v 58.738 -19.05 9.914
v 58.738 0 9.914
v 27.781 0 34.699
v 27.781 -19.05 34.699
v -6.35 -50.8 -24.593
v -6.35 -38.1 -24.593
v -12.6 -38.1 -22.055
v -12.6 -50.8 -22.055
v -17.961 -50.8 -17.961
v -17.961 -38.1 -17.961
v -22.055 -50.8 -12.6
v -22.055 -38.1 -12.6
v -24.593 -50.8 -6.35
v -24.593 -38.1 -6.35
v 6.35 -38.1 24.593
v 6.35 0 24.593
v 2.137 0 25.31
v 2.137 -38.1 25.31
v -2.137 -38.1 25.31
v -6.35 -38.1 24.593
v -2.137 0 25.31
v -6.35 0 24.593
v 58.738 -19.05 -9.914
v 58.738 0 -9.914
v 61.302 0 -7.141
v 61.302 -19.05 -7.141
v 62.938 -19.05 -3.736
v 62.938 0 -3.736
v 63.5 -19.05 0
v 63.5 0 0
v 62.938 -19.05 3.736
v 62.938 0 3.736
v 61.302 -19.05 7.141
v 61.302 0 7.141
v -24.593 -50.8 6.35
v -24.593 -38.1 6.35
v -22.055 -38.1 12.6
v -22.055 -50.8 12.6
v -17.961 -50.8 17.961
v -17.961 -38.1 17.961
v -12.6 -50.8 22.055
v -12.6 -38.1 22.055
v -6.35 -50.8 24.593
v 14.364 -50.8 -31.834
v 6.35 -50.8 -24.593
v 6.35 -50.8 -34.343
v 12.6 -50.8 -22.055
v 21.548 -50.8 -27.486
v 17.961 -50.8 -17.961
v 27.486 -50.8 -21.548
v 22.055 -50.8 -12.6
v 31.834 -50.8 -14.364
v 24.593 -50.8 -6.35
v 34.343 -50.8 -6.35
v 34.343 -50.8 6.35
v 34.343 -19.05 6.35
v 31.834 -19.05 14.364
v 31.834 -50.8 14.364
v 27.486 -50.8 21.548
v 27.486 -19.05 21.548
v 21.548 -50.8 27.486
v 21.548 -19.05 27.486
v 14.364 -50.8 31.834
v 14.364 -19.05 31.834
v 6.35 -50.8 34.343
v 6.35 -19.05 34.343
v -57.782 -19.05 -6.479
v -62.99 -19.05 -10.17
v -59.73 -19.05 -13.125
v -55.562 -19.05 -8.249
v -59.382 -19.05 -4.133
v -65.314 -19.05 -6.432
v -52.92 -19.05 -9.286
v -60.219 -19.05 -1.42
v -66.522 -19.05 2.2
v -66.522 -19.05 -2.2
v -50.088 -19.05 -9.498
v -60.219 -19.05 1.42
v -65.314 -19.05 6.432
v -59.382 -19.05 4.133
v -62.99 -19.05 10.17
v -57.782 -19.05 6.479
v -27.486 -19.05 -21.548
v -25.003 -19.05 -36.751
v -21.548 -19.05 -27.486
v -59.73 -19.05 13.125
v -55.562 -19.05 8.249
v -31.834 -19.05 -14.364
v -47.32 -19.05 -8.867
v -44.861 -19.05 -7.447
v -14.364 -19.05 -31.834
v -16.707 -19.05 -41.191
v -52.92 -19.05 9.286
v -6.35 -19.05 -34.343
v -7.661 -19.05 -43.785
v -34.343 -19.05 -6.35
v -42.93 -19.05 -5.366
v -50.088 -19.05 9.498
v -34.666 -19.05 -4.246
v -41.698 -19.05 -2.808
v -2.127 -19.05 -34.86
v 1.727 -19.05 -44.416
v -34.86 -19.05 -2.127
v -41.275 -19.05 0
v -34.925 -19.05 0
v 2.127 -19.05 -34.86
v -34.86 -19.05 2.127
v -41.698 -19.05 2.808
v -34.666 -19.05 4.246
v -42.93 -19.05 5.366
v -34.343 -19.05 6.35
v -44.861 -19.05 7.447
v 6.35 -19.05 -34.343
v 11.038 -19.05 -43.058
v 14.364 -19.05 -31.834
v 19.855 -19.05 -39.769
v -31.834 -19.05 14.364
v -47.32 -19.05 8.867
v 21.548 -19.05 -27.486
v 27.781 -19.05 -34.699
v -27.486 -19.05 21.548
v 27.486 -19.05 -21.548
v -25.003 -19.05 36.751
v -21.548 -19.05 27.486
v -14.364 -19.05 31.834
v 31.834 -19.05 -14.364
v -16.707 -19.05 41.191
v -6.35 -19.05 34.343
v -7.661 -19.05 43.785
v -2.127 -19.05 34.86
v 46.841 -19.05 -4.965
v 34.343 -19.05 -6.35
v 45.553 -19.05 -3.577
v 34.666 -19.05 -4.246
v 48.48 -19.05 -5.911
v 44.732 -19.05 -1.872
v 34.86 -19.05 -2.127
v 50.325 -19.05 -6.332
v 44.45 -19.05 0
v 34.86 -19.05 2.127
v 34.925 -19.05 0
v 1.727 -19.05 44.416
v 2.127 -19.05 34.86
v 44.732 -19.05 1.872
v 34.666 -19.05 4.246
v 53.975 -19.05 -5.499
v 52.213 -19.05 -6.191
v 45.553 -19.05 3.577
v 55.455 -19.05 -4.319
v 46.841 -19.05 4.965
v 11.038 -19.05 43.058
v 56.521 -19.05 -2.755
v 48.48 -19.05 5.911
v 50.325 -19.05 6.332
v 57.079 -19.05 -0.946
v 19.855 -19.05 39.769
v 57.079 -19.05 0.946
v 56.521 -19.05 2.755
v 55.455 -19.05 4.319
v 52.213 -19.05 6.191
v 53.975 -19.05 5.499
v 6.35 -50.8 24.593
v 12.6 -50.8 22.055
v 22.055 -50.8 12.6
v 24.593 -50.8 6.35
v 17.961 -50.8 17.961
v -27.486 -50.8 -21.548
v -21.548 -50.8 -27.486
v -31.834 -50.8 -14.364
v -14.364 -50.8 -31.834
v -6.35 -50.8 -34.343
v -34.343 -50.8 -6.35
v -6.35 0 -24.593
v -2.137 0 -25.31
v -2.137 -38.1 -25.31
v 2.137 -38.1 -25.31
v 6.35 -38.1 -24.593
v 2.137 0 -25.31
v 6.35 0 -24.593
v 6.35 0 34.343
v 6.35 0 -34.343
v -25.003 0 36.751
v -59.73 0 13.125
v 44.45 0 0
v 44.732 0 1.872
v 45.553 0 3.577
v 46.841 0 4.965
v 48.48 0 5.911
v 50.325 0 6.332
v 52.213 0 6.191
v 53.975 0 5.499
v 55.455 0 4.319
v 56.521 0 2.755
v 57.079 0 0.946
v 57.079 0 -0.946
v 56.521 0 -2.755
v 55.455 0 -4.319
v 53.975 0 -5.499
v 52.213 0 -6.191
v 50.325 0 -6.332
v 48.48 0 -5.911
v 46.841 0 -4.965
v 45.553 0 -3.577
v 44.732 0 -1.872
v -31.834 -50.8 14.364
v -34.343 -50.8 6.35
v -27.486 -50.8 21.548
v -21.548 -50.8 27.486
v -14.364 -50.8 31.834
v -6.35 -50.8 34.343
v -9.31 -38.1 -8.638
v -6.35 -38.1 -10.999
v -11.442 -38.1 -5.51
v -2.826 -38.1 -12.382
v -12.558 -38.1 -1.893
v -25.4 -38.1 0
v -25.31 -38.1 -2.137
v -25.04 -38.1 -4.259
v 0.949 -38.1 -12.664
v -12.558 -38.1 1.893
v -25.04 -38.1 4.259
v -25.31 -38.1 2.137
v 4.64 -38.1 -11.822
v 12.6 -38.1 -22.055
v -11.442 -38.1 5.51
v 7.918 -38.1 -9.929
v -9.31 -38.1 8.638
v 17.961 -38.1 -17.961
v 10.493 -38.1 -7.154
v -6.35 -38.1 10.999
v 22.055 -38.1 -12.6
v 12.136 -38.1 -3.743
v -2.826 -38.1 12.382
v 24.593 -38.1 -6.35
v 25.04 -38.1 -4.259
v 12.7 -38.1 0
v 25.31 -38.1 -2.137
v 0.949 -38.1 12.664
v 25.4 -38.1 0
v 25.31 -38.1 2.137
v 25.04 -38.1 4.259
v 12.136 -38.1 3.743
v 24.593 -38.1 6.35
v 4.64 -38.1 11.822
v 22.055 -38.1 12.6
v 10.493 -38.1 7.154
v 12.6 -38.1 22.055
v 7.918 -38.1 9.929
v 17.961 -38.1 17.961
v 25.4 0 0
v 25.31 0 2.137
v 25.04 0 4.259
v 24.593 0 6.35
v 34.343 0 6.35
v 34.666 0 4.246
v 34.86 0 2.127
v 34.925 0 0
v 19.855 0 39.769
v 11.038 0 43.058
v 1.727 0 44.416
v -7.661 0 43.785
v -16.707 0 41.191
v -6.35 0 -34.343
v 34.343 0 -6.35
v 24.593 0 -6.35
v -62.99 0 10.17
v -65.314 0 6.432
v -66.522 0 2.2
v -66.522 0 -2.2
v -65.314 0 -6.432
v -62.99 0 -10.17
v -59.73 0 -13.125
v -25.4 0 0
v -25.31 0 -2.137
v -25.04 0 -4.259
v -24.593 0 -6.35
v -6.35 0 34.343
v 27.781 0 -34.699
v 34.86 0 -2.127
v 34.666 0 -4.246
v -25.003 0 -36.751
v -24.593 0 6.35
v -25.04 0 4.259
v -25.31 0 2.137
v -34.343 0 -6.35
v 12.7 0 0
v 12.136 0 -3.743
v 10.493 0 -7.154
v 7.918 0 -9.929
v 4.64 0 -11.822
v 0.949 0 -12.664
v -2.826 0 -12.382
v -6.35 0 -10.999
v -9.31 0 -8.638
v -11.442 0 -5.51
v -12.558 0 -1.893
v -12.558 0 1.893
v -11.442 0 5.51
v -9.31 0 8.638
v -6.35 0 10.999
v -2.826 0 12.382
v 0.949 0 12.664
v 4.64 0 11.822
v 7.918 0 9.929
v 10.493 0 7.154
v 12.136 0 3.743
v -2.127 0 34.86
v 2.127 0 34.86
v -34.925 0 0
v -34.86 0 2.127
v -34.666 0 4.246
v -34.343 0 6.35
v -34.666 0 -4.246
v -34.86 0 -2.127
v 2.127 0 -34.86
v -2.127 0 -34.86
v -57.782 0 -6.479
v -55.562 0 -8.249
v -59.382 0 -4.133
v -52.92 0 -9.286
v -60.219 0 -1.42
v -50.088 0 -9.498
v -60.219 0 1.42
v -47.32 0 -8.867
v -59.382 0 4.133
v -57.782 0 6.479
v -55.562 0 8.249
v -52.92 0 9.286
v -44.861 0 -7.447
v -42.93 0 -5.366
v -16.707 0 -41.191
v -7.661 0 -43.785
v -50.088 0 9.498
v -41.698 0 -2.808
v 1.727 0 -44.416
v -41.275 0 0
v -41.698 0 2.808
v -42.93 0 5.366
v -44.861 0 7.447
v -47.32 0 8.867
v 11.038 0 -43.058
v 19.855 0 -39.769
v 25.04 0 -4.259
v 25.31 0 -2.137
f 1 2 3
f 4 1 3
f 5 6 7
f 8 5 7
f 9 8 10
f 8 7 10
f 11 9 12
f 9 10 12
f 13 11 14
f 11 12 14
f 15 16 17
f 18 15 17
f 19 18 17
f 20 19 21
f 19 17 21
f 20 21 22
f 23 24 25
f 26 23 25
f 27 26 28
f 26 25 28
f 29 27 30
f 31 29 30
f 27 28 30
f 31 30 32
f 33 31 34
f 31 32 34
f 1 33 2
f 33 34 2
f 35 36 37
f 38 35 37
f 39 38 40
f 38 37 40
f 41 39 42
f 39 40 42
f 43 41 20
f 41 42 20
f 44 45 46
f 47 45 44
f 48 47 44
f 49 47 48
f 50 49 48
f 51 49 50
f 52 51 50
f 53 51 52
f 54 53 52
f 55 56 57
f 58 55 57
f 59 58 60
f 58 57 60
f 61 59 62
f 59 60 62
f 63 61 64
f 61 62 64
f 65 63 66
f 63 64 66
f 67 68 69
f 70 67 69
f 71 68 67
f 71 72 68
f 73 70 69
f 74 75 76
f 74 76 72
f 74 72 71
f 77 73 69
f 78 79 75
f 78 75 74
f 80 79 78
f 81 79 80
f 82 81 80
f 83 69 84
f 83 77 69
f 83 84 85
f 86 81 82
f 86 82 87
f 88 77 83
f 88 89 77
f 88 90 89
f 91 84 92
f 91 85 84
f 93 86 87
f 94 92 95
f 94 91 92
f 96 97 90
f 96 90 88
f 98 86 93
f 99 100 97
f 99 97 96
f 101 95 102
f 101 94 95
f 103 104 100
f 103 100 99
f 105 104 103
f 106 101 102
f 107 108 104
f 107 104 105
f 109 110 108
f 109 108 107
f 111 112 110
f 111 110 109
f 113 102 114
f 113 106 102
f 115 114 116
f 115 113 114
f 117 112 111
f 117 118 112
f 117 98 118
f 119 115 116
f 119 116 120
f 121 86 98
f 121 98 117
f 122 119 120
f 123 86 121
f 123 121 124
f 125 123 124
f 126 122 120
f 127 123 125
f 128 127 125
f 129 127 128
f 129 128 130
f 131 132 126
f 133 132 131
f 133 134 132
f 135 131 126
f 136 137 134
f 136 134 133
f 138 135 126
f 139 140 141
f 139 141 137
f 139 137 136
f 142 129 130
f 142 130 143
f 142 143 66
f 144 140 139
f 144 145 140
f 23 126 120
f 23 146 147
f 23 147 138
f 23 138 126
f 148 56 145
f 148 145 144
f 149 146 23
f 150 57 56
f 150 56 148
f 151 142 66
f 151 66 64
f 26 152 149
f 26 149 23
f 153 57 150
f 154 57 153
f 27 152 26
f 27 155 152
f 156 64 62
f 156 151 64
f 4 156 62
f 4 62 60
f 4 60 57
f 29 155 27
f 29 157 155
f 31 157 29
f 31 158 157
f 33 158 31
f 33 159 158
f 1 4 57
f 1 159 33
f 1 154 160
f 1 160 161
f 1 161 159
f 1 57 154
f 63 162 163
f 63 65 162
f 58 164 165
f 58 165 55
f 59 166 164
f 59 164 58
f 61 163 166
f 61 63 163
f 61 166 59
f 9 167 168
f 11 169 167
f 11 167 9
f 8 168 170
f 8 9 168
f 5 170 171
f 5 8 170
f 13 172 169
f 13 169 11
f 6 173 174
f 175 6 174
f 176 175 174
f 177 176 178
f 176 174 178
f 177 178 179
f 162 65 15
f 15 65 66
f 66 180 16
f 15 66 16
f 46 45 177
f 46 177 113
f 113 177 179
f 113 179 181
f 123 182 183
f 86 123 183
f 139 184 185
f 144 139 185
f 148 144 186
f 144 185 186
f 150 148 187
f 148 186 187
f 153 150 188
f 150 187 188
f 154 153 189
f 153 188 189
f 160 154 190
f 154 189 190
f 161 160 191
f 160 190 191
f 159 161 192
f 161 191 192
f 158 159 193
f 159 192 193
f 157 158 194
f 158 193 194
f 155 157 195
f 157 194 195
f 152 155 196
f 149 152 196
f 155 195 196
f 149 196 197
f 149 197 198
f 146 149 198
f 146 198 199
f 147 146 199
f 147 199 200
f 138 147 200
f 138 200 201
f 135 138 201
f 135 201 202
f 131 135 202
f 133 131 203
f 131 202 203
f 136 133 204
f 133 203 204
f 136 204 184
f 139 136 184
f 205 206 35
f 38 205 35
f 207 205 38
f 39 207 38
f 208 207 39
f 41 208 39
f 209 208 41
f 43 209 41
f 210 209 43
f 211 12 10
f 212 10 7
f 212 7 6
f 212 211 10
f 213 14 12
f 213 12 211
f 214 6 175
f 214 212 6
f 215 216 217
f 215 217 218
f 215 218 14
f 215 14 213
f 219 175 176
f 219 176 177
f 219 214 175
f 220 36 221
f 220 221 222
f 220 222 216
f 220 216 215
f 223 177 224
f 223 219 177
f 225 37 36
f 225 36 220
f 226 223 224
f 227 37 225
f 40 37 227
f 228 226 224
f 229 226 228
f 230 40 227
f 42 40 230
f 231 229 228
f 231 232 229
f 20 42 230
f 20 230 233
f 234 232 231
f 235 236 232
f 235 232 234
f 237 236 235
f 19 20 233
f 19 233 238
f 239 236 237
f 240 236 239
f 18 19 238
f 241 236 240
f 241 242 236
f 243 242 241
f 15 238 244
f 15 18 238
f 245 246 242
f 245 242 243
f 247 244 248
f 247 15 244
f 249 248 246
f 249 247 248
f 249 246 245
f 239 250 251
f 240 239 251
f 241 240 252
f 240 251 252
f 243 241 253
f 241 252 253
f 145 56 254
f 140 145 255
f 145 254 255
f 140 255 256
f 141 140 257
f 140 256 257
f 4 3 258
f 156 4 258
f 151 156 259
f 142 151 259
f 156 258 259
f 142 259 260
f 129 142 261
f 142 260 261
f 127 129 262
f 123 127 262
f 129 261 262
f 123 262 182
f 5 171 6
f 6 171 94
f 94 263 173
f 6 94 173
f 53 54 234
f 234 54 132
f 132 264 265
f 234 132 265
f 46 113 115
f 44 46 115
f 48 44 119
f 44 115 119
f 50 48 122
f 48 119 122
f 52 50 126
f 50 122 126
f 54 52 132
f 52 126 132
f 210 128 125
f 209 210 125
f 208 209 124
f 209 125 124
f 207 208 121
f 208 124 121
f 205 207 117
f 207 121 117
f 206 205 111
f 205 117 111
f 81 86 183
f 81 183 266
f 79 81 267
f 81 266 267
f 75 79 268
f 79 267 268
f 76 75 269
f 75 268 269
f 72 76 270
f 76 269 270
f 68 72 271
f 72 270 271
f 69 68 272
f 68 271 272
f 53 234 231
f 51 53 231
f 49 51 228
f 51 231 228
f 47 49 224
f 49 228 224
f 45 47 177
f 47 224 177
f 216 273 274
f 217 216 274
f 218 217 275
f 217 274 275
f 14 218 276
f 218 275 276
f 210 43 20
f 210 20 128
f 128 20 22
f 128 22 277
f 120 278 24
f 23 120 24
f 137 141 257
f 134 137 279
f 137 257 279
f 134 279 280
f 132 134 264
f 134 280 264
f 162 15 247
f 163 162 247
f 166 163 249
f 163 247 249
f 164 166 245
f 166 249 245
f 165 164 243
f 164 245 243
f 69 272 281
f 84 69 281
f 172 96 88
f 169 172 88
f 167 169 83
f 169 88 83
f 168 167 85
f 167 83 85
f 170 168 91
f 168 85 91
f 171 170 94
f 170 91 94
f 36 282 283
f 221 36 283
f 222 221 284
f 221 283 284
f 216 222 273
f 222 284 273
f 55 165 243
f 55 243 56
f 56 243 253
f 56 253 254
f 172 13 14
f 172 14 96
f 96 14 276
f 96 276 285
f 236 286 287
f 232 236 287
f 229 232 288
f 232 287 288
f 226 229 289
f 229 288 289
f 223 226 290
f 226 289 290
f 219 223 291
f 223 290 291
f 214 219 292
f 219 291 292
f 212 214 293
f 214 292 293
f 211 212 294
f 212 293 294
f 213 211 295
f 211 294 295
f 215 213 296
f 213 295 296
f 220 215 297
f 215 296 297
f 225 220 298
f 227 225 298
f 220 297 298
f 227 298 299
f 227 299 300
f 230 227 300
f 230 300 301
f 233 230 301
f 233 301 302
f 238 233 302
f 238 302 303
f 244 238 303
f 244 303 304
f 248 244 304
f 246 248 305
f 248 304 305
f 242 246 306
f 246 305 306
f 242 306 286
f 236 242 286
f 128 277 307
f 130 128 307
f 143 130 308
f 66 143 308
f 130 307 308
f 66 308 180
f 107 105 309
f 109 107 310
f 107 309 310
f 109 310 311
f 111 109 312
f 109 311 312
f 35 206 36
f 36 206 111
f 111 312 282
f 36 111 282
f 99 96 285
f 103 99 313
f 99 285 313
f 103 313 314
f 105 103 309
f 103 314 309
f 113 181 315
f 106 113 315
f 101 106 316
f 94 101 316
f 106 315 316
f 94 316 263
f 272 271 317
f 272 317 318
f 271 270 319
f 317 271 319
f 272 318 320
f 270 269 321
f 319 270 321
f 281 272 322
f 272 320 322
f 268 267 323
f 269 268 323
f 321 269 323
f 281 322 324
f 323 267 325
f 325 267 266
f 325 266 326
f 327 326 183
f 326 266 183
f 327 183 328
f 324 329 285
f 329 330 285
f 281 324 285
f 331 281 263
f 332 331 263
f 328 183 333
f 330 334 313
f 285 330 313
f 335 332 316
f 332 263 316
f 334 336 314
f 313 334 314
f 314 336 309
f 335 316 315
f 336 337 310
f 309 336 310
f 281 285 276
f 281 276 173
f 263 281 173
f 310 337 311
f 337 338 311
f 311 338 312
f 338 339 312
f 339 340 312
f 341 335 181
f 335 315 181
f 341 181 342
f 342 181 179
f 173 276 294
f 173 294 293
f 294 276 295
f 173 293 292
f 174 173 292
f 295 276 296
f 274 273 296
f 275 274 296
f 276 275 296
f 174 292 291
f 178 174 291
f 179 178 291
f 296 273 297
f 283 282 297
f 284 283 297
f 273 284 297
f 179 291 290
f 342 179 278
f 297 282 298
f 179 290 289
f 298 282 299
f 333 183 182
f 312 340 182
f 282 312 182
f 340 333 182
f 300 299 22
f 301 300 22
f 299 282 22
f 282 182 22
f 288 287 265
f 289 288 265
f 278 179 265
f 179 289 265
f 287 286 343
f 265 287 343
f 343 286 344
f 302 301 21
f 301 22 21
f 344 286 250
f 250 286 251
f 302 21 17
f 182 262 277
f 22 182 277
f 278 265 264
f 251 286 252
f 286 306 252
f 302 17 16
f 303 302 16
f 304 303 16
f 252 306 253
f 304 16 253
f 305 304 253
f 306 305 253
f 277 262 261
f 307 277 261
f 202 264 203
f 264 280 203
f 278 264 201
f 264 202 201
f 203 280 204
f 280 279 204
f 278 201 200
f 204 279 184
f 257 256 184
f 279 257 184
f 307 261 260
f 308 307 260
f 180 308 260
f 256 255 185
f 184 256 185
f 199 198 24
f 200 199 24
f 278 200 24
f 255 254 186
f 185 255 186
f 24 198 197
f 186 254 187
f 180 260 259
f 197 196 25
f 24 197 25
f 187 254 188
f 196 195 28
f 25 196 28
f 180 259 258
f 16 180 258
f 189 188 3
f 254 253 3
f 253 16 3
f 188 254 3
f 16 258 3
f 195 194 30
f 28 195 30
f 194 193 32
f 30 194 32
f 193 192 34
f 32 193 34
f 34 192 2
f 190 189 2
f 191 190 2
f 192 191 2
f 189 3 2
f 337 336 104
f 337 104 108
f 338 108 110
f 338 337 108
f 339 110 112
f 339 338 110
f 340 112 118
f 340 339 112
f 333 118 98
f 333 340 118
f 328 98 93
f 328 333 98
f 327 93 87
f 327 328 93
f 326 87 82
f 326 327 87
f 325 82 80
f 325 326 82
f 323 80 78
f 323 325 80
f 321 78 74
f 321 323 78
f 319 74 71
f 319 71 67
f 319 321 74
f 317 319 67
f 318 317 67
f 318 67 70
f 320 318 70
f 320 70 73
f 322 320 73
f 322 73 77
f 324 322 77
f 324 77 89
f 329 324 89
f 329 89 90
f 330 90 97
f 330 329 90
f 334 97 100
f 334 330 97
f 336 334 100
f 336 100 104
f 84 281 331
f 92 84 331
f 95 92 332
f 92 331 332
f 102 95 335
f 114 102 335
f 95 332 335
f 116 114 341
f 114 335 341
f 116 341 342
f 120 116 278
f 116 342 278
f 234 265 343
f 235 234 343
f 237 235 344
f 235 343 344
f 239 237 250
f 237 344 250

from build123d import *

# Parameters (mm, degrees)
F0_R     = 9.525
F1_DEPTH = 19.05
F2_DEPTH = 50.8
F3_DEPTH = 38.1


with BuildPart() as f1:
    # F0 (on Front) → F1 (new body)
    with BuildSketch(Plane.XZ):
        with BuildLine():
            Line((-59.729688, -13.125407), (-25.003125, -36.751139))
            ThreePointArc((-25.003125, -36.751139), (1.727006, -44.416438), (27.78125, -34.69877))
            Line((27.78125, -34.69877), (58.7375, -9.913934))
            ThreePointArc((58.7375, -9.913934), (63.5, 0), (58.7375, 9.913934))
            Line((58.7375, 9.913934), (27.78125, 34.69877))
            ThreePointArc((27.78125, 34.69877), (1.727006, 44.416438), (-25.003125, 36.751139))
            Line((-25.003125, 36.751139), (-59.729688, 13.125407))
            ThreePointArc((-59.729688, 13.125407), (-66.675, 0), (-59.729688, -13.125407))
        make_face()
        with Locations((-50.8, 0)):
            Circle(F0_R, mode=Mode.SUBTRACT)
        with BuildLine():
            ThreePointArc((34.342876, 6.35), (34.779164, 3.188313), (34.925, 0))
            ThreePointArc((34.925, 0), (34.779164, -3.188313), (34.342876, -6.35))
            ThreePointArc((34.342876, -6.35), (24.695704, -24.695704), (6.35, -34.342876))
            ThreePointArc((6.35, -34.342876), (0, -34.925), (-6.35, -34.342876))
            ThreePointArc((-6.35, -34.342876), (-24.695704, -24.695704), (-34.342876, -6.35))
            ThreePointArc((-34.342876, -6.35), (-34.779164, -3.188313), (-34.925, 0))
            ThreePointArc((-34.925, 0), (-34.779164, 3.188313), (-34.342876, 6.35))
            ThreePointArc((-34.342876, 6.35), (-24.695704, 24.695704), (-6.35, 34.342876))
            ThreePointArc((-6.35, 34.342876), (0, 34.925), (6.35, 34.342876))
            ThreePointArc((6.35, 34.342876), (24.695704, 24.695704), (34.342876, 6.35))
        make_face(mode=Mode.SUBTRACT)
        with BuildLine():
            ThreePointArc((57.15, 0), (50.8, -6.35), (44.45, 0))
            ThreePointArc((44.45, 0), (50.8, 6.35), (57.15, 0))
        make_face(mode=Mode.SUBTRACT)
    extrude(amount=F1_DEPTH)

    # F0 (on Front) → F2 (join)
    with BuildSketch(Plane.XZ):
        with BuildLine():
            Line((-34.342876, 6.35), (-24.593444, 6.35))
            ThreePointArc((-24.593444, 6.35), (-17.960512, 17.960512), (-6.35, 24.593444))
            Line((-6.35, 24.593444), (-6.35, 34.342876))
            ThreePointArc((-6.35, 34.342876), (-24.695704, 24.695704), (-34.342876, 6.35))
        make_face()
        with BuildLine():
            ThreePointArc((6.35, 24.593444), (17.960512, 17.960512), (24.593444, 6.35))
            Line((24.593444, 6.35), (34.342876, 6.35))
            ThreePointArc((34.342876, 6.35), (24.695704, 24.695704), (6.35, 34.342876))
            Line((6.35, 34.342876), (6.35, 24.593444))
        make_face()
        with BuildLine():
            Line((34.342876, -6.35), (24.593444, -6.35))
            ThreePointArc((24.593444, -6.35), (17.960512, -17.960512), (6.35, -24.593444))
            Line((6.35, -24.593444), (6.35, -34.342876))
            ThreePointArc((6.35, -34.342876), (24.695704, -24.695704), (34.342876, -6.35))
        make_face()
        with BuildLine():
            ThreePointArc((-6.35, -24.593444), (-17.960512, -17.960512), (-24.593444, -6.35))
            Line((-24.593444, -6.35), (-34.342876, -6.35))
            ThreePointArc((-34.342876, -6.35), (-24.695704, -24.695704), (-6.35, -34.342876))
            Line((-6.35, -34.342876), (-6.35, -24.593444))
        make_face()
    extrude(amount=F2_DEPTH)

    # F0 (on Front) → F3 (join)
    with BuildSketch(Plane.XZ):
        with BuildLine():
            ThreePointArc((-12.7, 0), (0, 12.7), (12.7, 0))
            Line((12.7, 0), (25.4, 0))
            ThreePointArc((25.4, 0), (25.197554, 3.200509), (24.593444, 6.35))
            ThreePointArc((24.593444, 6.35), (17.960512, 17.960512), (6.35, 24.593444))
            ThreePointArc((6.35, 24.593444), (0, 25.4), (-6.35, 24.593444))
            ThreePointArc((-6.35, 24.593444), (-17.960512, 17.960512), (-24.593444, 6.35))
            ThreePointArc((-24.593444, 6.35), (-25.197554, 3.200509), (-25.4, 0))
            Line((-25.4, 0), (-12.7, 0))
        make_face()
        with BuildLine():
            Line((25.4, 0), (12.7, 0))
            ThreePointArc((12.7, 0), (0, -12.7), (-12.7, 0))
            Line((-12.7, 0), (-25.4, 0))
            ThreePointArc((-25.4, 0), (-25.197554, -3.200509), (-24.593444, -6.35))
            ThreePointArc((-24.593444, -6.35), (-17.960512, -17.960512), (-6.35, -24.593444))
            ThreePointArc((-6.35, -24.593444), (0, -25.4), (6.35, -24.593444))
            ThreePointArc((6.35, -24.593444), (17.960512, -17.960512), (24.593444, -6.35))
            ThreePointArc((24.593444, -6.35), (25.197554, -3.200509), (25.4, 0))
        make_face()
    extrude(amount=F3_DEPTH)


solid = f1.part
